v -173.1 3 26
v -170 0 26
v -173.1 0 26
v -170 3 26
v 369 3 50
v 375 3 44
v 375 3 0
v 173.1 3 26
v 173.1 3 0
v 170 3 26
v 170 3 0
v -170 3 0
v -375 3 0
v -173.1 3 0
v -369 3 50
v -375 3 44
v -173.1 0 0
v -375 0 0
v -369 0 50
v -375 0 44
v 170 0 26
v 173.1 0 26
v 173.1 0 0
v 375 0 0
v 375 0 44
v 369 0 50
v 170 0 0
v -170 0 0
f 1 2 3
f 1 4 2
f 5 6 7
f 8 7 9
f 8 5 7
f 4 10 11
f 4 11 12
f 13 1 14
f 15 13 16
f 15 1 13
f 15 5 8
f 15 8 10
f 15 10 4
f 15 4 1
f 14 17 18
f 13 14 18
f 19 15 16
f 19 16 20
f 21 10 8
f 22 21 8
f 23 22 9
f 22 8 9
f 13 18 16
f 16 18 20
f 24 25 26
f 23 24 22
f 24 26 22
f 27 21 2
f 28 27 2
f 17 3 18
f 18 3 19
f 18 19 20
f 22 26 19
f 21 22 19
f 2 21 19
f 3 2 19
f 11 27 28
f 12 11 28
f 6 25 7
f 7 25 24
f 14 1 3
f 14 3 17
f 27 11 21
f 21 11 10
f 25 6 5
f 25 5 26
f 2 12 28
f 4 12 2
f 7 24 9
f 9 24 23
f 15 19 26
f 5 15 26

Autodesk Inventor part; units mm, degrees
ref_plane "YZ Plane" through (0, 0, 0) normal (1, 0, 0) x (0, 1, 0)
ref_plane "XZ Plane" through (0, 0, 0) normal (0, 1, 0) x (-1, 0, 0)
ref_plane "XY Plane" through (0, 0, 0) normal (0, 0, 1) x (1, 0, 0)
sketch "Sketch2" plane through (0, 0, 0) normal (0, 1, 0) x (-1, 0, 0)
  line L0 (375, 50) -> (-375, 50)
  line L1 (-375, 50) -> (-375, 0)
  line L2 (-375, 0) -> (375, 0)
  line L3 (375, 0) -> (375, 50)
  circle A0 centre (-375, 0) radius 22.5
  circle A1 centre (375, 0) radius 22.5
  point P0 (0, 0)
  point P1 (0, 0)
  point P2 (-375, 22.5)
  point P3 (-352.5, 0)
  point P4 (352.5, 0)
  point P5 (375, 22.5)
  dimension "d18" = 750
  dimension "d19" = 50
  dimension "d20" = 45
extrude "Plate2" add sketch "Sketch2" along normal blind 3 contours L3 A1 L2 A0 L1 L0 | L3 L2 A1 | A0 L2 L1 picked at (360.188, 1.6689) picked at (-360.9308, 4.923)
sketch "Sketch3" plane through (0, 3, 0) normal (0, 1, 0) x (1, 0, 0)
  line L0 (-171.55, 0) -> (-171.55, -50) construction
  line L1 (-375, -50) -> (375, -50) construction
  line L2 (-375, -50) -> (-375, 0) projected
  line L3 (-173.1, 0) -> (-170, 0)
  line L4 (-170, 0) -> (-170, -26)
  line L5 (-170, -26) -> (-173.1, -26)
  line L6 (-173.1, -26) -> (-173.1, 0)
  line L7 (-375, 0) -> (375, 0) projected
  line L8 (375, 0) -> (-375, 0) projected
  line L9 (171.55, 0) -> (171.55, -50) construction
  line L10 (170, -26) -> (173.1, -26)
  line L11 (173.1, -26) -> (173.1, 0)
  line L12 (173.1, 0) -> (170, 0)
  line L13 (170, 0) -> (170, -26)
  line L14 (0, 0) -> (0, -50) construction
  point P0 (0, 0)
  point P1 (0, 0)
  point P2 (170, 0)
  point P3 (173.1, 0)
  dimension "d24" = 26
  dimension "d44" = 3.1
  dimension "d45" = 340
extrude "Extrusion1" cut sketch "Sketch3" against normal through all
sketch "Sketch5" plane through (0, 0, 0) normal (0, -1, 0) x (1, 0, 0)
  line L0 (-57.747, 1.3029) -> (-57.747, 31.8939) construction
  line L1 (-57.747, 31.8939) -> (96.7716, 31.8939) construction
  line L2 (96.7716, 31.8939) -> (96.7716, 1.3029) construction
  line L3 (96.7716, 1.3029) -> (-57.747, 1.3029) construction
  point P0 (0, 0)
mark "Mark1"
chamfer "Corner Chamfer2" distance 6 angle 45 2 edges at (375, 1.5, 50) (-375, 1.5, 50)
equation "\"d21\" = Thickness"
equation "\"BendReliefWidth\" = Thickness"
equation "\"BendReliefDepth\" = 0.5 * Thickness"
equation "\"CornerReliefSize\" = 4 * Thickness"
equation "\"MinimumRemnant\" = 2 * Thickness"
equation "\"TransitionRadius\" = BendRadius"
equation "\"JacobiRadiusSize\" = BendRadius"
equation "\"GapSize\" = Thickness"
equation "\"Thickness\" = 3"
equation "\"BendRadius\" = 5"
properties part number "MSC 107 RIB CONE" material "Stainless Steel"
